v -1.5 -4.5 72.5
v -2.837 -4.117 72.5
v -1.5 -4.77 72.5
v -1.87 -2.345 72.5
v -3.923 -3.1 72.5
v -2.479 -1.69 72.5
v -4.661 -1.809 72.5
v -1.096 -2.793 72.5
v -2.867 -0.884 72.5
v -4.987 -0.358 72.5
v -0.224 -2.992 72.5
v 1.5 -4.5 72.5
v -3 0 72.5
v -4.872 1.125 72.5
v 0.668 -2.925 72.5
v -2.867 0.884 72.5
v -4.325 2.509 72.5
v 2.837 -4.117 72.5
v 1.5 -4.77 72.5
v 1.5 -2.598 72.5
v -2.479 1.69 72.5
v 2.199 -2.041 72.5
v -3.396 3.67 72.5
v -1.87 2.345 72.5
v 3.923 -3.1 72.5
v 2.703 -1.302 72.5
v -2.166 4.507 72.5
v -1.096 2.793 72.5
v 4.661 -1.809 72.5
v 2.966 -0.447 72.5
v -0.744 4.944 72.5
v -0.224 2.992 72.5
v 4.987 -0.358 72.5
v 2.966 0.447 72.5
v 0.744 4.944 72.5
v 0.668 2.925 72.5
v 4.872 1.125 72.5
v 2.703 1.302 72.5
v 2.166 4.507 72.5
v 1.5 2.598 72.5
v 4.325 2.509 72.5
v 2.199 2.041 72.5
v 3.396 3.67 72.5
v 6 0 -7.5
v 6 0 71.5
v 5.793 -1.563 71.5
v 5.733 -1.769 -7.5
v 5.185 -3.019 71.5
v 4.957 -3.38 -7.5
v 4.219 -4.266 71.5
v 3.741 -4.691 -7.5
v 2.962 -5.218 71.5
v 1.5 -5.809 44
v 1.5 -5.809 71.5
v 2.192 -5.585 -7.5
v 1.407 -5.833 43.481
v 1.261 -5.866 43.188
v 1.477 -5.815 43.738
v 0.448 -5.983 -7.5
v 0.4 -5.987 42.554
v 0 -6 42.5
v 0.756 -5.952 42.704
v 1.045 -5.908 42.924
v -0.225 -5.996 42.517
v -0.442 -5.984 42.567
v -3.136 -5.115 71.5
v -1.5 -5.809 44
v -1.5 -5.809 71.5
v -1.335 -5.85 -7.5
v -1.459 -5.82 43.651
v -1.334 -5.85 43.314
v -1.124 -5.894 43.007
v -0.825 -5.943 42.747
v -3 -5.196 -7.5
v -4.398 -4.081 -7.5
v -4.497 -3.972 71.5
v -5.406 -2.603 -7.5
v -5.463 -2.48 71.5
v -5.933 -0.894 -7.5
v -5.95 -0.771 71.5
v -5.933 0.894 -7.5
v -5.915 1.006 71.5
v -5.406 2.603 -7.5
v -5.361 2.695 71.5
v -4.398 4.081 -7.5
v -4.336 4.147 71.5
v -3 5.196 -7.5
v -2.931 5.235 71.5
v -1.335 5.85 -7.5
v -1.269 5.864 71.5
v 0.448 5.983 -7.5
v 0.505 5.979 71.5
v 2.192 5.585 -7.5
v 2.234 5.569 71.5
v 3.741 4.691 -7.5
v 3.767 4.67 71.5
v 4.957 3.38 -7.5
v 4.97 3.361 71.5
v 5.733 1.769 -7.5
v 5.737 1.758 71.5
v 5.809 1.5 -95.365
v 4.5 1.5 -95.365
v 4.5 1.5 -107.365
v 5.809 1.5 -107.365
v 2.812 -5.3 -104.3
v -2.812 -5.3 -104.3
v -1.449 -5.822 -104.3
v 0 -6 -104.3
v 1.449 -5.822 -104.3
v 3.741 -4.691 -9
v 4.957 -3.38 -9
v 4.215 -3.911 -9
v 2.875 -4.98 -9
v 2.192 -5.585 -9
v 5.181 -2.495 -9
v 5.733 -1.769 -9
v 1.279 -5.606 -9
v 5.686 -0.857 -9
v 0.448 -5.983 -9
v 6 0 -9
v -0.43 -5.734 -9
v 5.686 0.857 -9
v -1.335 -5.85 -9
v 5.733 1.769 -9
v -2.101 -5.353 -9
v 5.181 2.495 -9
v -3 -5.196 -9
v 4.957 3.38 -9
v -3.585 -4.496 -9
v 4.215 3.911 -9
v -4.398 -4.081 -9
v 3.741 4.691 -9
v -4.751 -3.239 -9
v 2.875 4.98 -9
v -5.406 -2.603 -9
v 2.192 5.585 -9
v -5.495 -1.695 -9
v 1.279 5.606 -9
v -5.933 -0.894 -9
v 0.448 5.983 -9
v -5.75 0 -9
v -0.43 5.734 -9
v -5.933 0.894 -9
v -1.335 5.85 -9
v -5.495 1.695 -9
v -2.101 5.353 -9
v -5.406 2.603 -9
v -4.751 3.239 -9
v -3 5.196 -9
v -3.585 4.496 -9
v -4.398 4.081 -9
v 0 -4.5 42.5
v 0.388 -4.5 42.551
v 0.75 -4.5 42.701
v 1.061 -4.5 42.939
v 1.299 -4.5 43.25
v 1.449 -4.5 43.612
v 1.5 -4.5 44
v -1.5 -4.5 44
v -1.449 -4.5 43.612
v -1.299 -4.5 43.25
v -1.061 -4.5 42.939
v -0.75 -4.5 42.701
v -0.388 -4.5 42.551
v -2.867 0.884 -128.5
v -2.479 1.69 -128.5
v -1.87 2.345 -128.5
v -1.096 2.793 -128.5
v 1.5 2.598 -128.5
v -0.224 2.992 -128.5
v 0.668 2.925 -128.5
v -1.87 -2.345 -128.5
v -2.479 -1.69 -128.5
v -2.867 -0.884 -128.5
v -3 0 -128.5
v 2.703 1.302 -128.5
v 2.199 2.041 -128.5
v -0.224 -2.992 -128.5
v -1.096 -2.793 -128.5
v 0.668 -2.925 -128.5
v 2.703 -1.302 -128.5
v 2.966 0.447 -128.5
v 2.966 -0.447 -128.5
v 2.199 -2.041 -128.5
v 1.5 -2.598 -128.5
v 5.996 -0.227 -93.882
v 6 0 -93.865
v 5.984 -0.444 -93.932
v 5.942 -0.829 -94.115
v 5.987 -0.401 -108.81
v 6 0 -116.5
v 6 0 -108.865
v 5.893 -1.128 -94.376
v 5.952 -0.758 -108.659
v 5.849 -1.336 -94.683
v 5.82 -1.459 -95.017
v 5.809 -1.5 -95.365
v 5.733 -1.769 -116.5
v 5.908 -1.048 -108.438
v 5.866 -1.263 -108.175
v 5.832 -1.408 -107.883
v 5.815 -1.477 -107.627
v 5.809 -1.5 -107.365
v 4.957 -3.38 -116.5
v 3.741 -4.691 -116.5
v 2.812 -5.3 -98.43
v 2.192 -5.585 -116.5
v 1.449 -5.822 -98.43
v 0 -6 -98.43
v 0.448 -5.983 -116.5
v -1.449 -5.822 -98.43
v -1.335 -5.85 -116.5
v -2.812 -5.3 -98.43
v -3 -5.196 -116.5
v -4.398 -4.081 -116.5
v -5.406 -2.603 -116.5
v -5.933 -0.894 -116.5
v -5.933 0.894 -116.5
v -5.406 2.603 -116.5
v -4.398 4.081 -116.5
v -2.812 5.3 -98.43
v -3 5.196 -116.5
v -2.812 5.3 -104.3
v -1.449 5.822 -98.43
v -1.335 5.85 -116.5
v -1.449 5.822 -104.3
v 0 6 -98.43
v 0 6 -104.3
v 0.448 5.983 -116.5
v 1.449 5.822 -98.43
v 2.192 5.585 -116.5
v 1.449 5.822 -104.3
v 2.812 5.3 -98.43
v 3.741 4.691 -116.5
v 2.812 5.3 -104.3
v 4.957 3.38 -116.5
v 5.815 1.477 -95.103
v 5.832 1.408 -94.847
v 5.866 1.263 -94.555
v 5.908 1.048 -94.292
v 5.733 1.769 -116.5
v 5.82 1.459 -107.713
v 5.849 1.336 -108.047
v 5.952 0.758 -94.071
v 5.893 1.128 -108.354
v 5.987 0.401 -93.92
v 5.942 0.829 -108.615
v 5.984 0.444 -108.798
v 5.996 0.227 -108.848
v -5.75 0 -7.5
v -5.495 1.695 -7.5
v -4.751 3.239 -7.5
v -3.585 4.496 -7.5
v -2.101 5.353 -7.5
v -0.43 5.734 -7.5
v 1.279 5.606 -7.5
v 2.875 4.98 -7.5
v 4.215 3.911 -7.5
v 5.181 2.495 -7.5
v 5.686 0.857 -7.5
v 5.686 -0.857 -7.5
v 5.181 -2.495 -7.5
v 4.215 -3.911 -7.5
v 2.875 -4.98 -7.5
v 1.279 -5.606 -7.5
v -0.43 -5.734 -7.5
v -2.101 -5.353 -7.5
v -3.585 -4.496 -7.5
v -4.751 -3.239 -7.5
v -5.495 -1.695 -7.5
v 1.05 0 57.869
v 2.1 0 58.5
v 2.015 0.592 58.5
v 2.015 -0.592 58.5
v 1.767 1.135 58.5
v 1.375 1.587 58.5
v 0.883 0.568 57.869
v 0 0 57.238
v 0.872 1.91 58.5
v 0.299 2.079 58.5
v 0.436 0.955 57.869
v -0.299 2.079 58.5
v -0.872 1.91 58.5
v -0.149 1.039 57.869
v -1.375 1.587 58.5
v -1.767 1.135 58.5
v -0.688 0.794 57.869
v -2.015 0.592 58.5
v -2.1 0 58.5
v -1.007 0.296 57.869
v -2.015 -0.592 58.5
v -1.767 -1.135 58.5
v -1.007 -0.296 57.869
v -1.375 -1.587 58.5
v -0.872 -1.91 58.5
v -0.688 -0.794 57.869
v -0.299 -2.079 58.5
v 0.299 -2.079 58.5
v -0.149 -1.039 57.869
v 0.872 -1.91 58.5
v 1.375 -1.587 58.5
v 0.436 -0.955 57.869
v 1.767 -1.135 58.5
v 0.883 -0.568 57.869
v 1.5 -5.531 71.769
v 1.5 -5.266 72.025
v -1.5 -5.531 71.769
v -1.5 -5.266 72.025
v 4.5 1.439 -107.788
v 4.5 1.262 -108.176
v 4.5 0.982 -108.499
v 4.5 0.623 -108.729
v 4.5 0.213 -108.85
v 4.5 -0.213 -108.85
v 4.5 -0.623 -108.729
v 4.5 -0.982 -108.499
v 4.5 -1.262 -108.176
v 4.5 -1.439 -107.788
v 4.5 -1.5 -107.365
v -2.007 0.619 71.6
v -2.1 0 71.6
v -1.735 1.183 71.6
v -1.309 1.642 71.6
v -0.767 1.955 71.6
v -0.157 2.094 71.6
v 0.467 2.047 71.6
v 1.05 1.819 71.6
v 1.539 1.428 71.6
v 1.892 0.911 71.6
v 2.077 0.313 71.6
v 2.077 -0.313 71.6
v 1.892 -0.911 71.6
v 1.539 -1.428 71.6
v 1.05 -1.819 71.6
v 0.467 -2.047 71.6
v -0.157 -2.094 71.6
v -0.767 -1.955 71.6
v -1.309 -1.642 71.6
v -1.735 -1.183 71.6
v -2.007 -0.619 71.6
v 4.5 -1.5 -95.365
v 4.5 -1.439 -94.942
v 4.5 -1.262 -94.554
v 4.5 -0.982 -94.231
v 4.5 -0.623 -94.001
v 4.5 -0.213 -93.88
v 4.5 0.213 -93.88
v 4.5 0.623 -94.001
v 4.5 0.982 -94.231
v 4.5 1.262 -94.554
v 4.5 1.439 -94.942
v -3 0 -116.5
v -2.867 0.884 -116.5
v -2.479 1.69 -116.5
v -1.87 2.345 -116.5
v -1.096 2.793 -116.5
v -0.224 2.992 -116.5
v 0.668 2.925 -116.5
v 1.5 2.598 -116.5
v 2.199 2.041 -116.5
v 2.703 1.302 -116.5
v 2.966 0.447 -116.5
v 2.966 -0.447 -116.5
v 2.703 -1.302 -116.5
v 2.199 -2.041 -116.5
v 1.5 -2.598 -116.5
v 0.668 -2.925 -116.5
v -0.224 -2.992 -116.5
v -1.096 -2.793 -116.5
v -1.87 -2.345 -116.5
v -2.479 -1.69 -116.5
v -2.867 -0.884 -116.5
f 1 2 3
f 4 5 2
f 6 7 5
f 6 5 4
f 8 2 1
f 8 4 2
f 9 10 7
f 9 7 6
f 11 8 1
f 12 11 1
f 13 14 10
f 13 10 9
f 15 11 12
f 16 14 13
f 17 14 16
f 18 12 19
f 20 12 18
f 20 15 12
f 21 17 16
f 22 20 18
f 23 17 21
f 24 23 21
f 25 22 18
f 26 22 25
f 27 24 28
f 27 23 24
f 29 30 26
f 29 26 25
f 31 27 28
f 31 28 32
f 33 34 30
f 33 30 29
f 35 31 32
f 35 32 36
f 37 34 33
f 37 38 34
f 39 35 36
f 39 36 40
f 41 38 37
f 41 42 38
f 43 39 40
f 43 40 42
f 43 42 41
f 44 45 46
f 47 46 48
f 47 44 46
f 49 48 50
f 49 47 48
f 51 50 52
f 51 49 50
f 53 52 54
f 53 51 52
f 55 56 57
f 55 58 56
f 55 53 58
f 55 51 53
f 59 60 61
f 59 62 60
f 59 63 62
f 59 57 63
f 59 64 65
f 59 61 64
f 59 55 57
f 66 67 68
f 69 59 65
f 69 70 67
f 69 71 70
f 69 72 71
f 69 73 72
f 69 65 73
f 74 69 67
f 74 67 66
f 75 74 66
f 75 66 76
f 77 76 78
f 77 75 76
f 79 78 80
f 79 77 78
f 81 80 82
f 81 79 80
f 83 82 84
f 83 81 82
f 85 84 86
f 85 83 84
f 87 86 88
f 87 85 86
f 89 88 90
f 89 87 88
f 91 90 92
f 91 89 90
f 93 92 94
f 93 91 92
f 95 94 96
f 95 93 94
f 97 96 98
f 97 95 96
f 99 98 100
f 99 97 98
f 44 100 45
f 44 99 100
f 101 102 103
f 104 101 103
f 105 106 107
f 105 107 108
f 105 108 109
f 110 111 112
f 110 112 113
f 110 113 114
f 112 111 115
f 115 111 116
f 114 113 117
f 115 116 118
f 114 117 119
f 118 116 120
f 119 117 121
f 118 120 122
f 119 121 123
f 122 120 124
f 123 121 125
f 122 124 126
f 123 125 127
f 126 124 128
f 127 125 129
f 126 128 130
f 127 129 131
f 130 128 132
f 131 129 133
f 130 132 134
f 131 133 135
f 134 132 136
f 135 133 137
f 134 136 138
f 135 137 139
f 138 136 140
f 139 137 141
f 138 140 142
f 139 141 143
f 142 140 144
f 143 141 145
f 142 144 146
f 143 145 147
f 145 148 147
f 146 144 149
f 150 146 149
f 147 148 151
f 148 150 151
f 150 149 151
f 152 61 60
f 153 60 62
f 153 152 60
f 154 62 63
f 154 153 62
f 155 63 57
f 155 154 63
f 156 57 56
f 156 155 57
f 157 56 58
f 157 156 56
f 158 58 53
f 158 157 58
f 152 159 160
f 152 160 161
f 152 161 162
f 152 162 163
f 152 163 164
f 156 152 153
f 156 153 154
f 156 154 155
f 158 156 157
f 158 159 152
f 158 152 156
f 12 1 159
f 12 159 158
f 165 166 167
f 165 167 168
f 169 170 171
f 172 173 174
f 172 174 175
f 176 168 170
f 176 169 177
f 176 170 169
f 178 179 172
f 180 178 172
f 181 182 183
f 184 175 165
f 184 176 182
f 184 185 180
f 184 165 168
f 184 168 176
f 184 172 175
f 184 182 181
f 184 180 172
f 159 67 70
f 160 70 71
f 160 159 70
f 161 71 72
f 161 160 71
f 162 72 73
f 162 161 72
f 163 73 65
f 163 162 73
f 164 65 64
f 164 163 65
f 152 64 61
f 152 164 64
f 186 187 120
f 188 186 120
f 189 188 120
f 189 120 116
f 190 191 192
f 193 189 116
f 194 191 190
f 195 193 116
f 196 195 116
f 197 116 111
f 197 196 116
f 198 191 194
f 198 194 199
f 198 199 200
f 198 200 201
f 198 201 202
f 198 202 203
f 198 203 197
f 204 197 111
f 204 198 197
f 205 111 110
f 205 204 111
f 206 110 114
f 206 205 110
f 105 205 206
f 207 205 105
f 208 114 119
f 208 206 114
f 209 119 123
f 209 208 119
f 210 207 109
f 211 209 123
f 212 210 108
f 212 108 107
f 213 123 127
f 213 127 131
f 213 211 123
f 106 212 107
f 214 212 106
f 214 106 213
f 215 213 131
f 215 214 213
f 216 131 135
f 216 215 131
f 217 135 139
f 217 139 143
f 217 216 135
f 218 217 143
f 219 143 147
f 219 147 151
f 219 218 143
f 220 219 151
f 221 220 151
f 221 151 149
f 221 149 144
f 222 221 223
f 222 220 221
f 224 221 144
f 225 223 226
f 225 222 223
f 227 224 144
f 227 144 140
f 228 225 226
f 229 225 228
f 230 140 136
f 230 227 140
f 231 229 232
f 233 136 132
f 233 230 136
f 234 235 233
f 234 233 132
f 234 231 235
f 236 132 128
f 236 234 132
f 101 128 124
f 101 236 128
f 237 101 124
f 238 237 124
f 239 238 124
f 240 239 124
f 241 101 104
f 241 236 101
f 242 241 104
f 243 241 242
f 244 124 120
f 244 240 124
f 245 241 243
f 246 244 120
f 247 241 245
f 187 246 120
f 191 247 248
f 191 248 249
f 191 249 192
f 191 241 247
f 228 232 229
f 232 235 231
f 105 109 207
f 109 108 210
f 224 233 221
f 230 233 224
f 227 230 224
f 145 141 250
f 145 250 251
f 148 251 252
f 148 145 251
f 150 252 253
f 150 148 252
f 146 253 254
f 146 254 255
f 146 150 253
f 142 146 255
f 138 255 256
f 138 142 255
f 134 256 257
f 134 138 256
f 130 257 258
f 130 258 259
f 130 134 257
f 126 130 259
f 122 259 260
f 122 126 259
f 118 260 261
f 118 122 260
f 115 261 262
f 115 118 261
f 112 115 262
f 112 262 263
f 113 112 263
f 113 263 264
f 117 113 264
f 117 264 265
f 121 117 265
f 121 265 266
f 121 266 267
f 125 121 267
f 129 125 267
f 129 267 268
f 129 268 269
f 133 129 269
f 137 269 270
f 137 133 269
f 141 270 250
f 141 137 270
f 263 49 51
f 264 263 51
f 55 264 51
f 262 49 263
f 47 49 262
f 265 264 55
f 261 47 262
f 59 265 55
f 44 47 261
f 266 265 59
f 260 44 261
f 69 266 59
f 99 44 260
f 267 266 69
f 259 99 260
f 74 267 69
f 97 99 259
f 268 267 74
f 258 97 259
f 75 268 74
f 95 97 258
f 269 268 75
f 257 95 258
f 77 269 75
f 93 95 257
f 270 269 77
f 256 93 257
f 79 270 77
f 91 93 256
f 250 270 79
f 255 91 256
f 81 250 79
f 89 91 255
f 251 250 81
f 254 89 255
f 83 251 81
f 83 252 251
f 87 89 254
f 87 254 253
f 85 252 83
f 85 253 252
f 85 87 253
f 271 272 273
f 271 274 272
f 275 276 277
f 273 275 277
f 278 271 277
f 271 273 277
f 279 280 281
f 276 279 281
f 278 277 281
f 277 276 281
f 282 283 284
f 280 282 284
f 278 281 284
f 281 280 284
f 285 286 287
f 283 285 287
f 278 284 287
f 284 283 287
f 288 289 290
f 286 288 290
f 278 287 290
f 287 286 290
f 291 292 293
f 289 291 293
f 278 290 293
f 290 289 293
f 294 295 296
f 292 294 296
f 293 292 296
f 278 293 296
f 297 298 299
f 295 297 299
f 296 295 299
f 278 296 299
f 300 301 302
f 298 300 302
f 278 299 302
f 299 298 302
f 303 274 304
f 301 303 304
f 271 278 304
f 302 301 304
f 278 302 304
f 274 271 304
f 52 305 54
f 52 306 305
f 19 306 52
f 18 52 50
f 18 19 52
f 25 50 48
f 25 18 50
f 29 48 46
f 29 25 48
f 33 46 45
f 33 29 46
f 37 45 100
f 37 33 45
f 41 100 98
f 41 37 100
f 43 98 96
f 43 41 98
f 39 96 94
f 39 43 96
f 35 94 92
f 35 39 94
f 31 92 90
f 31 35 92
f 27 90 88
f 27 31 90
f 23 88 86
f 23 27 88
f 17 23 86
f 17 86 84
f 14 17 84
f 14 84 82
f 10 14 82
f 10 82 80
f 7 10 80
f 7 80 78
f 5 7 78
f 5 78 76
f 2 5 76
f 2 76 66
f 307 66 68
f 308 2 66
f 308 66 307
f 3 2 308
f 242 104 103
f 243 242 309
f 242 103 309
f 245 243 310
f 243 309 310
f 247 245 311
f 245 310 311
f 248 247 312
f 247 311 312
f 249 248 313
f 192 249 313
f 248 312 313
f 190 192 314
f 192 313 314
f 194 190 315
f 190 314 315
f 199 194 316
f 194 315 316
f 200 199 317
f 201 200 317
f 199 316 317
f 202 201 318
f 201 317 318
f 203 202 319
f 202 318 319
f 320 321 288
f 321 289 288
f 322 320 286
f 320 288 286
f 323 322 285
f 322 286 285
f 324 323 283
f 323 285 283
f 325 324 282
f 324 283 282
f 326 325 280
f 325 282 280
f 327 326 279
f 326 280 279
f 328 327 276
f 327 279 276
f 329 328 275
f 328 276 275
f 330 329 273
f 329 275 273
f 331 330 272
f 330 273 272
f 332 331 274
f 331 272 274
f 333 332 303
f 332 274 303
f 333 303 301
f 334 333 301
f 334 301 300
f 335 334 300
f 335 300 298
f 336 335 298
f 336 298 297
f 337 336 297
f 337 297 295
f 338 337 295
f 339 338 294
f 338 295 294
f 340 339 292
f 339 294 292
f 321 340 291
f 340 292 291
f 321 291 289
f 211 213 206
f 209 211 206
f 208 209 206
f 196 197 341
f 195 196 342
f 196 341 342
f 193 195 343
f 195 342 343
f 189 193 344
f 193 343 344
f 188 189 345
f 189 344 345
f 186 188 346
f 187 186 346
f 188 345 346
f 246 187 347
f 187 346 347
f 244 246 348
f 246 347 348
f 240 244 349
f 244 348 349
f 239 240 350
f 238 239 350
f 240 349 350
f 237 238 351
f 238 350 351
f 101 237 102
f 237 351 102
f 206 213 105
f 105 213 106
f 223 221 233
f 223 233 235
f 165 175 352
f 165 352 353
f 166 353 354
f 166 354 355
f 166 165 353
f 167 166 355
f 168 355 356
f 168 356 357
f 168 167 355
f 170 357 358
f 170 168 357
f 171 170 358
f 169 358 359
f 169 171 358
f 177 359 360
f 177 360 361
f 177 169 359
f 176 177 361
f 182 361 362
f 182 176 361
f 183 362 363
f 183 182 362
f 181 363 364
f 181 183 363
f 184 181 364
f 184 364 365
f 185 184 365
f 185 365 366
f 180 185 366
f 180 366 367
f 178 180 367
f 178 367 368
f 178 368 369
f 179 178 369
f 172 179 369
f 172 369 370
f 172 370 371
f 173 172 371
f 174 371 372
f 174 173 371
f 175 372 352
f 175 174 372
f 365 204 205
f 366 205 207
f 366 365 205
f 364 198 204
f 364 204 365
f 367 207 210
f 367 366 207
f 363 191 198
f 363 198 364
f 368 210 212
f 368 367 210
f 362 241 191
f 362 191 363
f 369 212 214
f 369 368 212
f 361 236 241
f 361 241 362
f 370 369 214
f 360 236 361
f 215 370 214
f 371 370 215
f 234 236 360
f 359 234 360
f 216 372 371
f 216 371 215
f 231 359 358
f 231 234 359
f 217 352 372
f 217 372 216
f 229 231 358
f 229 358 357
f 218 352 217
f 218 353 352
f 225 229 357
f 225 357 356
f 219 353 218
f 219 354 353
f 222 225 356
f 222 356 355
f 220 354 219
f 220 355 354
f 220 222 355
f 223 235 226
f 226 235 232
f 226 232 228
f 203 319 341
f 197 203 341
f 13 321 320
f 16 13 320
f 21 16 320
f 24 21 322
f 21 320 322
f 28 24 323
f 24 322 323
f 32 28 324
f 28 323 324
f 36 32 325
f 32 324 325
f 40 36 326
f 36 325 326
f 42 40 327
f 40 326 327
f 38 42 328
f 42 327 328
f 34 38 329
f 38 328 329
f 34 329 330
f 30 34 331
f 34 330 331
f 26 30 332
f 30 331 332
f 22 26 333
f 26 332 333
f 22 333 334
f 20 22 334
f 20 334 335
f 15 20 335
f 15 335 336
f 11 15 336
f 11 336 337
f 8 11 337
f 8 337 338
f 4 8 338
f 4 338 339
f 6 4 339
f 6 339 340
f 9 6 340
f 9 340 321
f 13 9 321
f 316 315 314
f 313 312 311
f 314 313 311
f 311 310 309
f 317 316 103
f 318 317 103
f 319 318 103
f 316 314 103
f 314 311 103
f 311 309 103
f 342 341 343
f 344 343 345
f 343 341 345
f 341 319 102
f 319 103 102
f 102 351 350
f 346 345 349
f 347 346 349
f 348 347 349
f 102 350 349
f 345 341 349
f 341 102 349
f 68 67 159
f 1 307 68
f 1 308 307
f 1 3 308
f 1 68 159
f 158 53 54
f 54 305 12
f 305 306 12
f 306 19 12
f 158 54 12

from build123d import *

# Parameters (mm, degrees)
SKETCH1_W                   = 107.1
SKETCH1_H                   = 6
SKETCH18_R                  = 6
BOSS_EXTRUDE1_DEPTH         = 72.5
CUT_EXTRUDE4_REACH          = 113.936
CUT_EXTRUDE4_END_RADIUS     = 6
CUT_EXTRUDE4_START          = -4.5
M5_TAPPED_HOLE3_D           = 4.2
M5_TAPPED_HOLE3_DEPTH       = 14
M5_TAPPED_HOLE3_CSINK_D     = 6
M5_TAPPED_HOLE3_CSINK_ANGLE = 90
M5_TAPPED_HOLE3_TIP         = 1.2618073
BOSS_EXTRUDE2_START         = 21.4
SKETCH22_R                  = 6
BOSS_EXTRUDE2_DEPTH         = 21.4
CHAMFER2_SIZE               = 1
SKETCH25_W                  = 3
SKETCH25_H                  = 3
CUT_EXTRUDE5_DEPTH          = 30
FILLET2_R                   = 1.5
SKETCH30_OUTSIDE_W          = 54.344
SKETCH30_OUTSIDE_H          = 54.344
SKETCH30_OUTSIDE_R          = 3
CUT_EXTRUDE10_DEPTH         = 12
CUT_EXTRUDE11_DEPTH         = 129.779850918
CUT_EXTRUDE11_DEPTH_BACK    = 129.779850918
SKETCH31_W                  = 5.87
SKETCH31_H                  = 22.819621357
SKETCH31_H_2                = 22.855520271
CUT_EXTRUDE12_START         = 4.5
CUT_EXTRUDE12_DEPTH         = 125.279850918
CUT_EXTRUDE13_START         = 50.3
SKETCH33_OUTSIDE_W          = 54.344
SKETCH33_OUTSIDE_H          = 54.344
SKETCH33_OUTSIDE_R          = 5.75
CUT_EXTRUDE13_DEPTH         = 1.5


with BuildPart() as part:
    # Sketch1 → Revolve1 (revolve)
    with BuildSketch(Plane(origin=(0, 0, 0), x_dir=(0, 0, -1), z_dir=(1, 0, 0)), mode=Mode.PRIVATE) as revolve1_sk:
        with Locations((53.55, 3)):
            Rectangle(SKETCH1_W, SKETCH1_H)
    revolve(revolve1_sk.sketch.rotate(Axis((0, 0, 38.636074766), (0, 0, -1)), 90), axis=Axis((0, 0, 38.636074766), (0, 0, -1)))

    # Sketch18 → Boss-Extrude1 (add)
    with BuildSketch(Plane.XY):
        Circle(SKETCH18_R)
    extrude(amount=BOSS_EXTRUDE1_DEPTH)

    # Cut-Extrude4: up to this cylinder (the profile starts inside it)
    cut_extrude4_end = Plane(origin=(0, 0, 57.9), z_dir=(0, 0, 1)) * Cylinder(CUT_EXTRUDE4_END_RADIUS, 240.872, mode=Mode.PRIVATE)
    # Sketch19 → Cut-Extrude4 (cut, up to the surface)
    with BuildSketch(Plane(origin=(0, 0, 0), x_dir=(1, 0, 0), z_dir=(0, 1, 0)).offset(CUT_EXTRUDE4_START), mode=Mode.PRIVATE) as cut_extrude4_sk1:
        with BuildLine():
            Line((-1.5, -63.9), (-1.5, -51.9))
            ThreePointArc((-1.5, -51.9), (0, -50.4), (1.5, -51.9))
            Line((1.5, -51.9), (1.5, -63.9))
            ThreePointArc((1.5, -63.9), (0, -65.4), (-1.5, -63.9))
        make_face()
    cut_extrude4_tool1 = extrude(cut_extrude4_sk1.sketch, amount=-CUT_EXTRUDE4_REACH, mode=Mode.PRIVATE) & cut_extrude4_end
    add(cut_extrude4_tool1.solids().sort_by_distance((0, -4.5, 57.9))[0], mode=Mode.SUBTRACT)

    # M5 Tapped Hole3
    with Locations(Plane.XY.offset(72.5)):
        with Locations((0, 0)):
            CounterSinkHole(M5_TAPPED_HOLE3_D / 2, M5_TAPPED_HOLE3_CSINK_D / 2, depth=M5_TAPPED_HOLE3_DEPTH, counter_sink_angle=M5_TAPPED_HOLE3_CSINK_ANGLE)
            with Locations((0, 0, -(M5_TAPPED_HOLE3_DEPTH + M5_TAPPED_HOLE3_TIP / 2))):  # 118° drill point
                Cone(0, M5_TAPPED_HOLE3_D / 2, M5_TAPPED_HOLE3_TIP, mode=Mode.SUBTRACT)

    # Sketch22 → Boss-Extrude2 (add)
    with BuildSketch(Plane(origin=(0, 0, -107.1), x_dir=(-1, 0, 0), z_dir=(0, 0, -1)).offset(BOSS_EXTRUDE2_START)):
        with Locations(Location((0, 0, 0), (0, 0, 180))):
            Circle(SKETCH22_R)
    extrude(amount=-BOSS_EXTRUDE2_DEPTH)

    # Chamfer2
    chamfer2_edges = [part.edges().sort_by_distance(p)[0] for p in [
        (-6, 0, 72.5),
    ]]
    chamfer(chamfer2_edges, length=CHAMFER2_SIZE)

    # Sketch25 → Cut-Extrude5 (cut)
    with BuildSketch(Plane.XY.offset(72.5)):
        with Locations((0, -6)):
            Rectangle(SKETCH25_W, SKETCH25_H)
    extrude(amount=-CUT_EXTRUDE5_DEPTH, mode=Mode.SUBTRACT)

    # Fillet2
    fillet2_edges = [part.edges().sort_by_distance(p)[0] for p in [
        (1.5, -5.15473751, 42.5),
        (-1.5, -5.15473751, 42.5),
    ]]
    fillet(fillet2_edges, radius=FILLET2_R - 0.0001)  # a hair under: the kernel refuses the full size

    # Sketch30 outside → Cut-Extrude10 (cut)
    with BuildSketch(Plane(origin=(0, 0, -128.5), x_dir=(-1, 0, 0), z_dir=(0, 0, -1))):
        Rectangle(SKETCH30_OUTSIDE_W, SKETCH30_OUTSIDE_H)
        Circle(SKETCH30_OUTSIDE_R, mode=Mode.SUBTRACT)
    extrude(amount=-CUT_EXTRUDE10_DEPTH, mode=Mode.SUBTRACT)

    # Sketch31 → Cut-Extrude11 (cut, two sides: drawn at the far end of the back side and taken through both)
    with BuildSketch(Plane(origin=(0, 0, 0), x_dir=(0, 0, -1), z_dir=(1, 0, 0)).offset(-CUT_EXTRUDE11_DEPTH_BACK)):
        with Locations((101.365, -16.709810679)):
            Rectangle(SKETCH31_W, SKETCH31_H)
        with Locations((101.365, 16.727760135)):
            Rectangle(SKETCH31_W, SKETCH31_H_2)
    extrude(amount=CUT_EXTRUDE11_DEPTH + CUT_EXTRUDE11_DEPTH_BACK, mode=Mode.SUBTRACT)

    # Sketch32 → Cut-Extrude12 (cut, through all)
    with BuildSketch(Plane(origin=(0, 0, 0), x_dir=(0, 0, -1), z_dir=(1, 0, 0)).offset(CUT_EXTRUDE12_START)):
        with BuildLine():
            Line((107.365, -1.5), (95.365, -1.5))
            ThreePointArc((95.365, -1.5), (93.865, 0), (95.365, 1.5))
            Line((95.365, 1.5), (107.365, 1.5))
            ThreePointArc((107.365, 1.5), (108.865, 0), (107.365, -1.5))
        make_face()
    extrude(amount=CUT_EXTRUDE12_DEPTH, mode=Mode.SUBTRACT)

    # Sketch33 outside → Cut-Extrude13 (cut)
    with BuildSketch(Plane(origin=(0, 0, 41.3), x_dir=(-1, 0, 0), z_dir=(0, 0, -1)).offset(CUT_EXTRUDE13_START)):
        Rectangle(SKETCH33_OUTSIDE_W, SKETCH33_OUTSIDE_H)
        Circle(SKETCH33_OUTSIDE_R, mode=Mode.SUBTRACT)
    extrude(amount=-CUT_EXTRUDE13_DEPTH, mode=Mode.SUBTRACT)


solid = part.part
